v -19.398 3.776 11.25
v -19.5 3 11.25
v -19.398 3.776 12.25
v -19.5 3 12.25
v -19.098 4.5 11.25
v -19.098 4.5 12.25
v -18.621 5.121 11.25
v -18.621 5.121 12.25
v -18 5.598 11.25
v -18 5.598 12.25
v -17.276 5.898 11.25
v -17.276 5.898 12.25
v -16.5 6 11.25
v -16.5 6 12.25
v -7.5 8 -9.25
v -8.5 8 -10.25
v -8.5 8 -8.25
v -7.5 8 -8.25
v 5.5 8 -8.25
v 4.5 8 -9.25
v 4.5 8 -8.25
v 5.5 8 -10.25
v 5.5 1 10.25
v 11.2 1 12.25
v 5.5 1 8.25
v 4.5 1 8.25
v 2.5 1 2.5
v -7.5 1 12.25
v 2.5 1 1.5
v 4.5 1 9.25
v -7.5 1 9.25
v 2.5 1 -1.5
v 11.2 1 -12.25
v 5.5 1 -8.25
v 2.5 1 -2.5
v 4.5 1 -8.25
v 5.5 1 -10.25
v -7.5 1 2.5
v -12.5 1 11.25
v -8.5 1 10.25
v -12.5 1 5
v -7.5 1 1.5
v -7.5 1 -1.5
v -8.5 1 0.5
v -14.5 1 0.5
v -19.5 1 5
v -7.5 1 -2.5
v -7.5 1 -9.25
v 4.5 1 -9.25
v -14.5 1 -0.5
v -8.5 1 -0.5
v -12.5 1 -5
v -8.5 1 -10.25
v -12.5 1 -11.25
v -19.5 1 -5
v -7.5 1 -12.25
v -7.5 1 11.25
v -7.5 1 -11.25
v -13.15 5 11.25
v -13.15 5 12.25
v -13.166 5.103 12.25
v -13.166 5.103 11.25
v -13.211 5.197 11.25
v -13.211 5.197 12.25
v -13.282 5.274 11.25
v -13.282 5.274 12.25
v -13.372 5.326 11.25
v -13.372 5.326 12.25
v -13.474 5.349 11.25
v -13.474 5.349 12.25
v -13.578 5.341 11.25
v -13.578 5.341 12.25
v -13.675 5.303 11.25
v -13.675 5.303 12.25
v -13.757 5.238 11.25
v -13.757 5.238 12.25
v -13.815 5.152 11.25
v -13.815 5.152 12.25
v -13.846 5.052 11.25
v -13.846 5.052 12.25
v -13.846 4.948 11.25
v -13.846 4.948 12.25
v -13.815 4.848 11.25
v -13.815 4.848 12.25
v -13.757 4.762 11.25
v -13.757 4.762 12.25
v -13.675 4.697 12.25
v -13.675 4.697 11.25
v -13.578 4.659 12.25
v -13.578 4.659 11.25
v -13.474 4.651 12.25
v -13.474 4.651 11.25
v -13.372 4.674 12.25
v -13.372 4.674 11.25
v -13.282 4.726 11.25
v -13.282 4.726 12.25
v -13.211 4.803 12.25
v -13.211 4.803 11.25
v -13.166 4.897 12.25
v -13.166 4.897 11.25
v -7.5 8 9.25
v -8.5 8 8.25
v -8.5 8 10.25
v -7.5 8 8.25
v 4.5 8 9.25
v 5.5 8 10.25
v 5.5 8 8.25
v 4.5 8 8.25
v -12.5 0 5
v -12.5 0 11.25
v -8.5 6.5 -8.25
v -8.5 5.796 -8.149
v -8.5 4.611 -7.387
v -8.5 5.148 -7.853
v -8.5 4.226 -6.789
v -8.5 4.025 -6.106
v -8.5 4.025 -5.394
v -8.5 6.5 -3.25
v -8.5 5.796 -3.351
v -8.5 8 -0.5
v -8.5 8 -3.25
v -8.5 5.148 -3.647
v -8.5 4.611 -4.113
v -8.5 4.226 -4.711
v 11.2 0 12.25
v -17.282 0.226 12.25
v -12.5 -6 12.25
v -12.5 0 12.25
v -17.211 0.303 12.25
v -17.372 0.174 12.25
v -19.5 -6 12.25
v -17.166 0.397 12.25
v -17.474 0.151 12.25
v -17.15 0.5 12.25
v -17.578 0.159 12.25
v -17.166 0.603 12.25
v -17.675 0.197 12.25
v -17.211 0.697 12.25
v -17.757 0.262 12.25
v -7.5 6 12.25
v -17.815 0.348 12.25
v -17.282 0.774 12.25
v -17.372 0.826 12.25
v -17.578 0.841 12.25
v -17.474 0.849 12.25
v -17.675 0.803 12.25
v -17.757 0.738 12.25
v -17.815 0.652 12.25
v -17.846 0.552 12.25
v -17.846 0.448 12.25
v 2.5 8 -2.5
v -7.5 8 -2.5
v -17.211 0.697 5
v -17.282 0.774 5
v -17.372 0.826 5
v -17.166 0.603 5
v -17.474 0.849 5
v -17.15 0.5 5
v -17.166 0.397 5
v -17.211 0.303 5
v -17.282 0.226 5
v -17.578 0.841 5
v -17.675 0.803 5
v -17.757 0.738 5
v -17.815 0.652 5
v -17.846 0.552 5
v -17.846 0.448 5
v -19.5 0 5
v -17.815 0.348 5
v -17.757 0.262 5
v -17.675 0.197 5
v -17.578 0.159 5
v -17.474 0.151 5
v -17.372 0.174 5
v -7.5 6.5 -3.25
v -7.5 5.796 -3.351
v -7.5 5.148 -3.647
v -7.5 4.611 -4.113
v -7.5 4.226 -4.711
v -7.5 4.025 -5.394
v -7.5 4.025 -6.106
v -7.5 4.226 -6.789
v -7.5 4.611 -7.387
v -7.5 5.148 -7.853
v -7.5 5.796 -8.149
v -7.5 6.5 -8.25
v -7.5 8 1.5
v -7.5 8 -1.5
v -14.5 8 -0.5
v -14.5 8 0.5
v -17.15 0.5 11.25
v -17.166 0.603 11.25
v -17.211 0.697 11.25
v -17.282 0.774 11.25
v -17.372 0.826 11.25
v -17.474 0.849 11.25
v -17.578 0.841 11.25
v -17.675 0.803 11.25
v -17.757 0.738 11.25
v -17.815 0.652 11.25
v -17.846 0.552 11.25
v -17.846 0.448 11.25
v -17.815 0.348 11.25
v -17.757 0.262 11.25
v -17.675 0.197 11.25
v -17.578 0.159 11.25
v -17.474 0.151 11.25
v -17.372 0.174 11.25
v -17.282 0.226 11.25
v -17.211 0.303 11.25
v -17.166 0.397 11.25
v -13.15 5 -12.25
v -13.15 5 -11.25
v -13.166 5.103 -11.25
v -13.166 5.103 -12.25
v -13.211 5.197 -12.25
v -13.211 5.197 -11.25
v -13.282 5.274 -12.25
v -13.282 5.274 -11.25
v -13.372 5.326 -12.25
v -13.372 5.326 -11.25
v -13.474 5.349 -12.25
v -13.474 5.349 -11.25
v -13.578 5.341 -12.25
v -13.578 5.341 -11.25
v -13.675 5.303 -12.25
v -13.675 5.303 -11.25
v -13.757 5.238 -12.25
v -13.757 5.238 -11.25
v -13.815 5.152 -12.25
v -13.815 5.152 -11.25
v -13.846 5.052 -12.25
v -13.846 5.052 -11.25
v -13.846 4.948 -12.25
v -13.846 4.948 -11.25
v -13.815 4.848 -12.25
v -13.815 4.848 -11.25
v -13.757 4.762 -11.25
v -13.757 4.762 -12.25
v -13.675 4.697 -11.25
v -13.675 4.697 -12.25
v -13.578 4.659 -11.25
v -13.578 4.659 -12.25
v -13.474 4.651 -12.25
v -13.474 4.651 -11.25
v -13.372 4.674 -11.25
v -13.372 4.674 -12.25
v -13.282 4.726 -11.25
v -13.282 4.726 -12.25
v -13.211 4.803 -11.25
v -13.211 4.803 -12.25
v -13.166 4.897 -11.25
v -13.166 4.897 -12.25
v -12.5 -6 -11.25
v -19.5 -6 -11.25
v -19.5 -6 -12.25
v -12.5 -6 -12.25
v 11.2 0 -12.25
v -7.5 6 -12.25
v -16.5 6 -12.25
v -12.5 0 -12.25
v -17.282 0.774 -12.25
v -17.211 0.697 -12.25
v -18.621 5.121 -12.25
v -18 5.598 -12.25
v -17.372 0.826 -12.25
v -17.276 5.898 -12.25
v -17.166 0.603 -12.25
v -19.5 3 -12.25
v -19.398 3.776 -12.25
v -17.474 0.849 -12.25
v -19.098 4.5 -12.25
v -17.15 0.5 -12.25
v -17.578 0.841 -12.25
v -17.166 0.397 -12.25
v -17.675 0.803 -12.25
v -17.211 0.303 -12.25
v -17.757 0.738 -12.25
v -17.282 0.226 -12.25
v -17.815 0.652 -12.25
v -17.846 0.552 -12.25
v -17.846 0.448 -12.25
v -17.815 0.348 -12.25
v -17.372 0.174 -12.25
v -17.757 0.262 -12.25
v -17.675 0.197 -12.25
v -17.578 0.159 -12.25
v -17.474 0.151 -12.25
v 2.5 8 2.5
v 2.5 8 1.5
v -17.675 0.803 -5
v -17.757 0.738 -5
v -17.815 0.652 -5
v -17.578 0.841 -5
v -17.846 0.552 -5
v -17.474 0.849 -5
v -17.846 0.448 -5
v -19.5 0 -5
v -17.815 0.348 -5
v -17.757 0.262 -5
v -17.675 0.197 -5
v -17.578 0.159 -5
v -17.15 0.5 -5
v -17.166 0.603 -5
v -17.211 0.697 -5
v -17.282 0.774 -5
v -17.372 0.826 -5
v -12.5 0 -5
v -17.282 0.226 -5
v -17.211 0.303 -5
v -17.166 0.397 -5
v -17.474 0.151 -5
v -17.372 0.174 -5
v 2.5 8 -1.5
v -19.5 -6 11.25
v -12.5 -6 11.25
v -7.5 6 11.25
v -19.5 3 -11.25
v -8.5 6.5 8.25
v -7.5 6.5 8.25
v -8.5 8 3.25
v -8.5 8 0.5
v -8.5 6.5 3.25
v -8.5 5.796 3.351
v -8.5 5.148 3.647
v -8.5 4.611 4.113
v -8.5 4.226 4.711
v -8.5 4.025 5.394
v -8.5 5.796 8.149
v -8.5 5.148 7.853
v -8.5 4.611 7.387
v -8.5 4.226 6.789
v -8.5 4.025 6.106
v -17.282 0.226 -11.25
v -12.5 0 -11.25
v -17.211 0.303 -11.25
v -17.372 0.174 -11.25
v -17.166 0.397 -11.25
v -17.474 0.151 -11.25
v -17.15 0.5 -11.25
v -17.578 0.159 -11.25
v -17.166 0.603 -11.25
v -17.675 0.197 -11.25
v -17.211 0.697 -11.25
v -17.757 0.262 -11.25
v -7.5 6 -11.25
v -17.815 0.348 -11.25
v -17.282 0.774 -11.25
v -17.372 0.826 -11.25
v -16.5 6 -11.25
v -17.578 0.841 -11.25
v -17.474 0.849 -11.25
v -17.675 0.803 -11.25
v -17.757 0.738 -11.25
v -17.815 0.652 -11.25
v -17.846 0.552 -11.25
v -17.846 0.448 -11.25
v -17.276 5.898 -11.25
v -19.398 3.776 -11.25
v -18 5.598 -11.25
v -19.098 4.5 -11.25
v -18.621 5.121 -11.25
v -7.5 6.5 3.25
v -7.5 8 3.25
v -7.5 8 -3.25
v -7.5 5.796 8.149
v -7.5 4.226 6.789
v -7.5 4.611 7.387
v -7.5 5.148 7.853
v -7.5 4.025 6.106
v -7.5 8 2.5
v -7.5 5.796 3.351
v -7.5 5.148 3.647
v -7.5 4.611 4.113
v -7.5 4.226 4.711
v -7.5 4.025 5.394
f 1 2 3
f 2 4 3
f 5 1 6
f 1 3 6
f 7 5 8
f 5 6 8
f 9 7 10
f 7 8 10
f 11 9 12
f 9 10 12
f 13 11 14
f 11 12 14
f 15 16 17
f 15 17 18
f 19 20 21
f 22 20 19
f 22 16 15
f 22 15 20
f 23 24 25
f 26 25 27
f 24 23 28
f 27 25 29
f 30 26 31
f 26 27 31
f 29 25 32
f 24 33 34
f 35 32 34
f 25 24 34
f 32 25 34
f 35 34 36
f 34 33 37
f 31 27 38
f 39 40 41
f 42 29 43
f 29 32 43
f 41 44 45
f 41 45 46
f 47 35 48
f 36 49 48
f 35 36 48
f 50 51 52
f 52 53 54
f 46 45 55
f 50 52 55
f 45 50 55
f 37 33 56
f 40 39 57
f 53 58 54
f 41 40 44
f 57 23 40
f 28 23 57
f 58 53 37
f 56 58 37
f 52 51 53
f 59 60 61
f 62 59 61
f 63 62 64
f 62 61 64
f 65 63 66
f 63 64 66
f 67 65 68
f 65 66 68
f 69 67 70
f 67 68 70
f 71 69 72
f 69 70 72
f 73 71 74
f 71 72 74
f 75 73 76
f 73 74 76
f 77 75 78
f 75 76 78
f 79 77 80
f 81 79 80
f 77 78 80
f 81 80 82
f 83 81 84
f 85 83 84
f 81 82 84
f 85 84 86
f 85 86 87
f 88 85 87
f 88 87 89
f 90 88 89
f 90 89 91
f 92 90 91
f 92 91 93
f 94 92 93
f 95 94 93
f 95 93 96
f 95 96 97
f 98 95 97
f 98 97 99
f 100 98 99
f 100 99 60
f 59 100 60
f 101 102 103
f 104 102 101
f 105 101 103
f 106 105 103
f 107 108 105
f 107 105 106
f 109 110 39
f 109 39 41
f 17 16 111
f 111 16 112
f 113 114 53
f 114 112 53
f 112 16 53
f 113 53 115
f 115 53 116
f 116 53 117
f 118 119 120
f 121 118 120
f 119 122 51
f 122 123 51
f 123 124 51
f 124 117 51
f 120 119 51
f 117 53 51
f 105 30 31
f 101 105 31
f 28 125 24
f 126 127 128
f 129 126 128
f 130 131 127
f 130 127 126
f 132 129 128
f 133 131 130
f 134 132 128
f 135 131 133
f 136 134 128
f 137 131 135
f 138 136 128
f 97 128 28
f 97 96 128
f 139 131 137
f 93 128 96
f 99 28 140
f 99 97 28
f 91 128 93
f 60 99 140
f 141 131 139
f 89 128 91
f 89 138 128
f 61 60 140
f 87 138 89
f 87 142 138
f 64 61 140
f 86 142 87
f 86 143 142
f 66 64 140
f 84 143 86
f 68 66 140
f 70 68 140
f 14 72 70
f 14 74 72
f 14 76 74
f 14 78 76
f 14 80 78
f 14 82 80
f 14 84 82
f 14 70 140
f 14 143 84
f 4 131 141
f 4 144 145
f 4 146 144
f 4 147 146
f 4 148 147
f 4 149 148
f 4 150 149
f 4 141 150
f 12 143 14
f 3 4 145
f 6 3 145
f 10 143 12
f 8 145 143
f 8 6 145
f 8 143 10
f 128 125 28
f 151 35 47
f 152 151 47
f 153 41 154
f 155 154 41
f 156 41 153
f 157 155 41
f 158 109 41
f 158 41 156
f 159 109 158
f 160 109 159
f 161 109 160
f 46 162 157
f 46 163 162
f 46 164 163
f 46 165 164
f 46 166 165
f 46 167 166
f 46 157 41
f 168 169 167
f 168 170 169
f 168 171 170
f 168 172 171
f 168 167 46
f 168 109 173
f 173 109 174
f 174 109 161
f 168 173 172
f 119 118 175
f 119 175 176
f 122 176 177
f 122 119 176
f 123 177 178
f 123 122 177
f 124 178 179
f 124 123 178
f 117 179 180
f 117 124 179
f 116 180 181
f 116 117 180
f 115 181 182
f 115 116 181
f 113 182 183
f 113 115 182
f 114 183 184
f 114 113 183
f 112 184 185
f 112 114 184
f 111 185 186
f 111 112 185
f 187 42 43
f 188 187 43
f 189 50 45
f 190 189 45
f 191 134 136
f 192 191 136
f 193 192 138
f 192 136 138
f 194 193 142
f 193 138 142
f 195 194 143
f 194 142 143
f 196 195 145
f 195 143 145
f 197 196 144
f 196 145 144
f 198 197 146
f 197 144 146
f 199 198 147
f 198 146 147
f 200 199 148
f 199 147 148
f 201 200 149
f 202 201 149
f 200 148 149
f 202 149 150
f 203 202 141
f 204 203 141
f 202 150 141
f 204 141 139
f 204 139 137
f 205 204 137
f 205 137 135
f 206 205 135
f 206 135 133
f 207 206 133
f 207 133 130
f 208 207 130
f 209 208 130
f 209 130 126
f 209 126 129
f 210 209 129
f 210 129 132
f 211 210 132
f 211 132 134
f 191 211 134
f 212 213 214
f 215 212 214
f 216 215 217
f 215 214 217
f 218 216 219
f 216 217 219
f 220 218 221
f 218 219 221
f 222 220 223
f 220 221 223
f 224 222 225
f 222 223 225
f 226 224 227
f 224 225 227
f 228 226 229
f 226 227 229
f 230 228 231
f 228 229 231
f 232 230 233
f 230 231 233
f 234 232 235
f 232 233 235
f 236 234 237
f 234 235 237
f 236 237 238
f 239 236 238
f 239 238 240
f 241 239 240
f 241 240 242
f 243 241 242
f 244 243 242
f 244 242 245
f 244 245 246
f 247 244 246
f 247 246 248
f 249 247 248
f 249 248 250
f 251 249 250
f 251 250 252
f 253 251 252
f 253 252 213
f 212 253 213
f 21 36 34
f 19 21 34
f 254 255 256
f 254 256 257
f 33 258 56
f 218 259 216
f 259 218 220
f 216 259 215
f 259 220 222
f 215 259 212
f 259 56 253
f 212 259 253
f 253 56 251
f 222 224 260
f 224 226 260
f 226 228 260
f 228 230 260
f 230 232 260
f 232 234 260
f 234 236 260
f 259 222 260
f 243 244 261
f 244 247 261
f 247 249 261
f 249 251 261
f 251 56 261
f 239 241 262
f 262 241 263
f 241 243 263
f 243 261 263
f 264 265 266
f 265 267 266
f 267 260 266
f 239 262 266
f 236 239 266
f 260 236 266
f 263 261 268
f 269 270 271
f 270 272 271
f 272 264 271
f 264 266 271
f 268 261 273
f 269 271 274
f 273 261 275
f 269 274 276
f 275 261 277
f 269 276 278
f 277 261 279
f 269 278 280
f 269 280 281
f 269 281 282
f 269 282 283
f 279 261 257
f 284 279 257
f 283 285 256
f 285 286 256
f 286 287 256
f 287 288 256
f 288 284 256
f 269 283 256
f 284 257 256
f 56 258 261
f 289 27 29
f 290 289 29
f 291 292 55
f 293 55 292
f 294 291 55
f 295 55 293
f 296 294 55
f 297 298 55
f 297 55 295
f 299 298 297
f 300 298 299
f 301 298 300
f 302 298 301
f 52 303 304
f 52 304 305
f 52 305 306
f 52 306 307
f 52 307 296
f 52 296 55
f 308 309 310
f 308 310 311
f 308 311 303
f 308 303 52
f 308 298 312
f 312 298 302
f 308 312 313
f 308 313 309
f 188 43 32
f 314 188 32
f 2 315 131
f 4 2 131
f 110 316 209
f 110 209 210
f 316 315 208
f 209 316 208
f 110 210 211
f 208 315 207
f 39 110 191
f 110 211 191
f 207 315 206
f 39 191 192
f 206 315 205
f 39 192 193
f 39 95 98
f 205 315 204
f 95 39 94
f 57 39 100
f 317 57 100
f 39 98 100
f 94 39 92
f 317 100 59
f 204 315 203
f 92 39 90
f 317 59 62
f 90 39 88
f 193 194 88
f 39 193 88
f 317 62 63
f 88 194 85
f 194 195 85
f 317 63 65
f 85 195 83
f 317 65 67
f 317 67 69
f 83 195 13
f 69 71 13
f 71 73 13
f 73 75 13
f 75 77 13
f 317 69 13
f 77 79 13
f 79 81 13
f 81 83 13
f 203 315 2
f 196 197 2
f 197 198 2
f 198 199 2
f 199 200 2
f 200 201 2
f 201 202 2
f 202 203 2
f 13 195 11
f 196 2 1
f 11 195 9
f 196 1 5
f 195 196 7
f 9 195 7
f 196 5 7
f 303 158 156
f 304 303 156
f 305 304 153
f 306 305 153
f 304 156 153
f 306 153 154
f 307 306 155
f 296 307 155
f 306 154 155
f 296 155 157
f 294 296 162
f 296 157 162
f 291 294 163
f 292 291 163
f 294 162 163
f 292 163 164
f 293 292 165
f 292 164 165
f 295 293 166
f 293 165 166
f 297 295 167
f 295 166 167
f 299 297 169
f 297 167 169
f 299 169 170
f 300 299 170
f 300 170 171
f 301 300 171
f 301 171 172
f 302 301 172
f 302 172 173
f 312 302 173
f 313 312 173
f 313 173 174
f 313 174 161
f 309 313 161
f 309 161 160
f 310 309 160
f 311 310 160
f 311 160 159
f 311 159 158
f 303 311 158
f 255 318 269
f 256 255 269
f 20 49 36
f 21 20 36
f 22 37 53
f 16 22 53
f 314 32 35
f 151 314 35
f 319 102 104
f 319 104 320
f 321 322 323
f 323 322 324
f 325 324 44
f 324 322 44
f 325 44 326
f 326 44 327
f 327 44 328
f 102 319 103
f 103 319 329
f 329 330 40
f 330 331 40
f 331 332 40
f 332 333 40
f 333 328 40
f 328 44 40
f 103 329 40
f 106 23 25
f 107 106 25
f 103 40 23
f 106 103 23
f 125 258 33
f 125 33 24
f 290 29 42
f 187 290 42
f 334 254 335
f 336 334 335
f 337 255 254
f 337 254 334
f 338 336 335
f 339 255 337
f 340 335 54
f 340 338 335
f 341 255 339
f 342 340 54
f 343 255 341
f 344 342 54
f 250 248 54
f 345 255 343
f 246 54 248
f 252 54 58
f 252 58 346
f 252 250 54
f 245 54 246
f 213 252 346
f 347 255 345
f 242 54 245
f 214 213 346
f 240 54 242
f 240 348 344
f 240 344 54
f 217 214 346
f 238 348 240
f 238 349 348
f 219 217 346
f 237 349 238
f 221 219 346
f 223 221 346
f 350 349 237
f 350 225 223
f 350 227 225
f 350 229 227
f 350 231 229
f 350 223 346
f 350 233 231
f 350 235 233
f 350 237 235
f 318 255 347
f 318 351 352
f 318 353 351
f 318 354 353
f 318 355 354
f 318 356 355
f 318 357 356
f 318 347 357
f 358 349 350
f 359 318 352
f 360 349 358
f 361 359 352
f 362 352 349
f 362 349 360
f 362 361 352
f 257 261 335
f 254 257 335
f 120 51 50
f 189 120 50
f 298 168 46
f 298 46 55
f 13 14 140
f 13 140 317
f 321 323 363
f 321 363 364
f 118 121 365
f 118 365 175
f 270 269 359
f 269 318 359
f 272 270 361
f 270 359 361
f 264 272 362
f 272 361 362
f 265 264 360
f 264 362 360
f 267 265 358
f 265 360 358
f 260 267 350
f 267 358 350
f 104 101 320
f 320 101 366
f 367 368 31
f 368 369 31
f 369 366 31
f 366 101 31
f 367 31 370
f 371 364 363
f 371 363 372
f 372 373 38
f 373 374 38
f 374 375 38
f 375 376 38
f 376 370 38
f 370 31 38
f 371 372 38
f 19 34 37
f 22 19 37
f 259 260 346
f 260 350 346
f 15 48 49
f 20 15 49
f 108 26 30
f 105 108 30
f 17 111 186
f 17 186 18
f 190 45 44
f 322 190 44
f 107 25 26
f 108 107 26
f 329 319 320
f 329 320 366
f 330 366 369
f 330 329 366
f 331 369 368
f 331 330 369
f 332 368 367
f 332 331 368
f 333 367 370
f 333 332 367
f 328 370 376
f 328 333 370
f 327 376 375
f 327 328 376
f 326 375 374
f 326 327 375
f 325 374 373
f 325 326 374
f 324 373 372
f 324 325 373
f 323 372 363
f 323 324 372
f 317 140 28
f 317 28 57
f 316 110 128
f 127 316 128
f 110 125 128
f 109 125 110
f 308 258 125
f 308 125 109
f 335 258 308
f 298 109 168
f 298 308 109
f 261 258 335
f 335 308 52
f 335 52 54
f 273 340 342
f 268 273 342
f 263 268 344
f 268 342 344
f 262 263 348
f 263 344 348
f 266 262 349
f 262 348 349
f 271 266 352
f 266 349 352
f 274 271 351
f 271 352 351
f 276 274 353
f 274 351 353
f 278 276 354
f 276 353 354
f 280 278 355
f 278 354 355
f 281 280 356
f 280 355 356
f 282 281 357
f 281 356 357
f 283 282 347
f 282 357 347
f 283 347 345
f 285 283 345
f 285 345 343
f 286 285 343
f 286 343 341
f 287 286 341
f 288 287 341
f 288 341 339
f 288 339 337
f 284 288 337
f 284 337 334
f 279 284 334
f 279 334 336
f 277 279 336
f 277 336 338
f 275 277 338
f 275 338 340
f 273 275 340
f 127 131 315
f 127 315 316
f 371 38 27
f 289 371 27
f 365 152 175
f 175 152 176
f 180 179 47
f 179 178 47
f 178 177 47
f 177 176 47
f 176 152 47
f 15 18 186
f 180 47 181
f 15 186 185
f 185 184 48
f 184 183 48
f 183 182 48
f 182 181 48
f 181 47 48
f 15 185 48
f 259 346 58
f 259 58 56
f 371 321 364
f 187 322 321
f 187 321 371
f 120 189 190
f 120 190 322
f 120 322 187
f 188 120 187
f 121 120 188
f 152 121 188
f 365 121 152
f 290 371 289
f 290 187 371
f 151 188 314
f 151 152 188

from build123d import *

# Parameters (mm, degrees)
EXTRUDE_1_DEPTH      = 1
SKETCH_2_W           = 7
SKETCH_2_H           = 1
EXTRUDE_2_DEPTH      = 6
EXTRUDE_2_DEPTH_BACK = 6
FILLET_1_R           = 3
SKETCH_3_R           = 0.35
CUT_EXTRUDE_1_DEPTH  = 25.5
SKETCH_4_W           = 1
SKETCH_4_H           = 5
EXTRUDE_3_DEPTH      = 5
EXTRUDE_4_DEPTH      = 7
CUT_EXTRUDE_2_DEPTH  = 7


with BuildPart() as part:
    # 草图1 → 凸台-拉伸1 (new body)
    with BuildSketch(Plane(origin=(0, 0, 0), x_dir=(1, 0, 0), z_dir=(0, 1, 0))):
        Polygon((-12.5, 12.25), (11.2, 12.25), (11.2, -12.25), (-12.5, -12.25), (-19.5, -12.25), (-19.5, -11.25), (-12.5, -11.25), (-12.5, -5), (-19.5, -5), (-19.5, 5), (-12.5, 5), (-12.5, 11.25), (-19.5, 11.25), (-19.5, 12.25), align=None)
    extrude(amount=EXTRUDE_1_DEPTH)

    # 草图2 → 凸台-拉伸2 (add, two sides)
    with BuildSketch(Plane.XZ) as extrude_2_sk:
        with Locations((-16, 11.75)):
            Rectangle(SKETCH_2_W, SKETCH_2_H)
        with Locations((-16, -11.75)):
            Rectangle(SKETCH_2_W, SKETCH_2_H)
    extrude(amount=EXTRUDE_2_DEPTH)
    extrude(extrude_2_sk.sketch, amount=-EXTRUDE_2_DEPTH_BACK)

    # 圆角1
    fillet_1_edges = [part.edges().sort_by_distance(p)[0] for p in [
        (-19.5, 6, 11.75),
        (-19.5, 6, -11.75),
    ]]
    fillet(fillet_1_edges, radius=FILLET_1_R)

    # 草图3 → 切除-拉伸1 (cut, through all)
    with BuildSketch(Plane.XY.offset(12.25)):
        with Locations((-17.5, 0.5)):
            Circle(SKETCH_3_R)
        with Locations((-13.5, 5)):
            Circle(SKETCH_3_R)
    extrude(amount=-CUT_EXTRUDE_1_DEPTH, mode=Mode.SUBTRACT)

    # 草图4 → 凸台-拉伸3 (add)
    with BuildSketch(Plane(origin=(-12.5, 0, 0), x_dir=(0, 0, -1), z_dir=(1, 0, 0))):
        with Locations((-11.75, 3.5)):
            Rectangle(SKETCH_4_W, SKETCH_4_H)
        with Locations((11.75, 3.5)):
            Rectangle(SKETCH_4_W, SKETCH_4_H)
    extrude(amount=EXTRUDE_3_DEPTH)

    # 草图5 → 凸台-拉伸4 (add)
    with BuildSketch(Plane(origin=(0, 1, 0), x_dir=(1, 0, 0), z_dir=(0, 1, 0))):
        Polygon((-8.5, -8.25), (-8.5, -10.25), (5.5, -10.25), (5.5, -8.25), (4.5, -8.25), (4.5, -9.25), (-7.5, -9.25), (-7.5, -8.25), (-7.5, -3.5), (-7.5, -2.5), (2.5, -2.5), (2.5, -1.5), (-7.5, -1.5), (-7.5, 1.5), (2.5, 1.5), (2.5, 2.5), (-7.5, 2.5), (-7.5, 3.5), (-7.5, 8.25), (-7.5, 9.25), (4.5, 9.25), (4.5, 8.25), (5.5, 8.25), (5.5, 10.25), (-8.5, 10.25), (-8.5, 8.25), (-8.5, 3.742436738), (-8.5, 0.5), (-14.5, 0.5), (-14.5, -0.5), (-8.5, -0.5), (-8.5, -3.5), align=None)
    extrude(amount=EXTRUDE_4_DEPTH)

    # 草图6 → 切除-拉伸2 (cut)
    with BuildSketch(Plane.ZY.offset(8.5)):
        with BuildLine():
            Line((-8.25, 6.5), (-8.25, 9.621499742))
            Line((-8.25, 9.621499742), (-3.25, 9.621499742))
            Line((-3.25, 9.621499742), (-3.25, 6.5))
            ThreePointArc((-3.25, 6.5), (-5.75, 4), (-8.25, 6.5))
        make_face()
        with BuildLine():
            Line((3.25, 6.5), (3.25, 9.830182827))
            Line((3.25, 9.830182827), (8.25, 9.830182827))
            Line((8.25, 9.830182827), (8.25, 6.5))
            ThreePointArc((8.25, 6.5), (5.75, 4), (3.25, 6.5))
        make_face()
    extrude(amount=-CUT_EXTRUDE_2_DEPTH, mode=Mode.SUBTRACT)


solid = part.part
